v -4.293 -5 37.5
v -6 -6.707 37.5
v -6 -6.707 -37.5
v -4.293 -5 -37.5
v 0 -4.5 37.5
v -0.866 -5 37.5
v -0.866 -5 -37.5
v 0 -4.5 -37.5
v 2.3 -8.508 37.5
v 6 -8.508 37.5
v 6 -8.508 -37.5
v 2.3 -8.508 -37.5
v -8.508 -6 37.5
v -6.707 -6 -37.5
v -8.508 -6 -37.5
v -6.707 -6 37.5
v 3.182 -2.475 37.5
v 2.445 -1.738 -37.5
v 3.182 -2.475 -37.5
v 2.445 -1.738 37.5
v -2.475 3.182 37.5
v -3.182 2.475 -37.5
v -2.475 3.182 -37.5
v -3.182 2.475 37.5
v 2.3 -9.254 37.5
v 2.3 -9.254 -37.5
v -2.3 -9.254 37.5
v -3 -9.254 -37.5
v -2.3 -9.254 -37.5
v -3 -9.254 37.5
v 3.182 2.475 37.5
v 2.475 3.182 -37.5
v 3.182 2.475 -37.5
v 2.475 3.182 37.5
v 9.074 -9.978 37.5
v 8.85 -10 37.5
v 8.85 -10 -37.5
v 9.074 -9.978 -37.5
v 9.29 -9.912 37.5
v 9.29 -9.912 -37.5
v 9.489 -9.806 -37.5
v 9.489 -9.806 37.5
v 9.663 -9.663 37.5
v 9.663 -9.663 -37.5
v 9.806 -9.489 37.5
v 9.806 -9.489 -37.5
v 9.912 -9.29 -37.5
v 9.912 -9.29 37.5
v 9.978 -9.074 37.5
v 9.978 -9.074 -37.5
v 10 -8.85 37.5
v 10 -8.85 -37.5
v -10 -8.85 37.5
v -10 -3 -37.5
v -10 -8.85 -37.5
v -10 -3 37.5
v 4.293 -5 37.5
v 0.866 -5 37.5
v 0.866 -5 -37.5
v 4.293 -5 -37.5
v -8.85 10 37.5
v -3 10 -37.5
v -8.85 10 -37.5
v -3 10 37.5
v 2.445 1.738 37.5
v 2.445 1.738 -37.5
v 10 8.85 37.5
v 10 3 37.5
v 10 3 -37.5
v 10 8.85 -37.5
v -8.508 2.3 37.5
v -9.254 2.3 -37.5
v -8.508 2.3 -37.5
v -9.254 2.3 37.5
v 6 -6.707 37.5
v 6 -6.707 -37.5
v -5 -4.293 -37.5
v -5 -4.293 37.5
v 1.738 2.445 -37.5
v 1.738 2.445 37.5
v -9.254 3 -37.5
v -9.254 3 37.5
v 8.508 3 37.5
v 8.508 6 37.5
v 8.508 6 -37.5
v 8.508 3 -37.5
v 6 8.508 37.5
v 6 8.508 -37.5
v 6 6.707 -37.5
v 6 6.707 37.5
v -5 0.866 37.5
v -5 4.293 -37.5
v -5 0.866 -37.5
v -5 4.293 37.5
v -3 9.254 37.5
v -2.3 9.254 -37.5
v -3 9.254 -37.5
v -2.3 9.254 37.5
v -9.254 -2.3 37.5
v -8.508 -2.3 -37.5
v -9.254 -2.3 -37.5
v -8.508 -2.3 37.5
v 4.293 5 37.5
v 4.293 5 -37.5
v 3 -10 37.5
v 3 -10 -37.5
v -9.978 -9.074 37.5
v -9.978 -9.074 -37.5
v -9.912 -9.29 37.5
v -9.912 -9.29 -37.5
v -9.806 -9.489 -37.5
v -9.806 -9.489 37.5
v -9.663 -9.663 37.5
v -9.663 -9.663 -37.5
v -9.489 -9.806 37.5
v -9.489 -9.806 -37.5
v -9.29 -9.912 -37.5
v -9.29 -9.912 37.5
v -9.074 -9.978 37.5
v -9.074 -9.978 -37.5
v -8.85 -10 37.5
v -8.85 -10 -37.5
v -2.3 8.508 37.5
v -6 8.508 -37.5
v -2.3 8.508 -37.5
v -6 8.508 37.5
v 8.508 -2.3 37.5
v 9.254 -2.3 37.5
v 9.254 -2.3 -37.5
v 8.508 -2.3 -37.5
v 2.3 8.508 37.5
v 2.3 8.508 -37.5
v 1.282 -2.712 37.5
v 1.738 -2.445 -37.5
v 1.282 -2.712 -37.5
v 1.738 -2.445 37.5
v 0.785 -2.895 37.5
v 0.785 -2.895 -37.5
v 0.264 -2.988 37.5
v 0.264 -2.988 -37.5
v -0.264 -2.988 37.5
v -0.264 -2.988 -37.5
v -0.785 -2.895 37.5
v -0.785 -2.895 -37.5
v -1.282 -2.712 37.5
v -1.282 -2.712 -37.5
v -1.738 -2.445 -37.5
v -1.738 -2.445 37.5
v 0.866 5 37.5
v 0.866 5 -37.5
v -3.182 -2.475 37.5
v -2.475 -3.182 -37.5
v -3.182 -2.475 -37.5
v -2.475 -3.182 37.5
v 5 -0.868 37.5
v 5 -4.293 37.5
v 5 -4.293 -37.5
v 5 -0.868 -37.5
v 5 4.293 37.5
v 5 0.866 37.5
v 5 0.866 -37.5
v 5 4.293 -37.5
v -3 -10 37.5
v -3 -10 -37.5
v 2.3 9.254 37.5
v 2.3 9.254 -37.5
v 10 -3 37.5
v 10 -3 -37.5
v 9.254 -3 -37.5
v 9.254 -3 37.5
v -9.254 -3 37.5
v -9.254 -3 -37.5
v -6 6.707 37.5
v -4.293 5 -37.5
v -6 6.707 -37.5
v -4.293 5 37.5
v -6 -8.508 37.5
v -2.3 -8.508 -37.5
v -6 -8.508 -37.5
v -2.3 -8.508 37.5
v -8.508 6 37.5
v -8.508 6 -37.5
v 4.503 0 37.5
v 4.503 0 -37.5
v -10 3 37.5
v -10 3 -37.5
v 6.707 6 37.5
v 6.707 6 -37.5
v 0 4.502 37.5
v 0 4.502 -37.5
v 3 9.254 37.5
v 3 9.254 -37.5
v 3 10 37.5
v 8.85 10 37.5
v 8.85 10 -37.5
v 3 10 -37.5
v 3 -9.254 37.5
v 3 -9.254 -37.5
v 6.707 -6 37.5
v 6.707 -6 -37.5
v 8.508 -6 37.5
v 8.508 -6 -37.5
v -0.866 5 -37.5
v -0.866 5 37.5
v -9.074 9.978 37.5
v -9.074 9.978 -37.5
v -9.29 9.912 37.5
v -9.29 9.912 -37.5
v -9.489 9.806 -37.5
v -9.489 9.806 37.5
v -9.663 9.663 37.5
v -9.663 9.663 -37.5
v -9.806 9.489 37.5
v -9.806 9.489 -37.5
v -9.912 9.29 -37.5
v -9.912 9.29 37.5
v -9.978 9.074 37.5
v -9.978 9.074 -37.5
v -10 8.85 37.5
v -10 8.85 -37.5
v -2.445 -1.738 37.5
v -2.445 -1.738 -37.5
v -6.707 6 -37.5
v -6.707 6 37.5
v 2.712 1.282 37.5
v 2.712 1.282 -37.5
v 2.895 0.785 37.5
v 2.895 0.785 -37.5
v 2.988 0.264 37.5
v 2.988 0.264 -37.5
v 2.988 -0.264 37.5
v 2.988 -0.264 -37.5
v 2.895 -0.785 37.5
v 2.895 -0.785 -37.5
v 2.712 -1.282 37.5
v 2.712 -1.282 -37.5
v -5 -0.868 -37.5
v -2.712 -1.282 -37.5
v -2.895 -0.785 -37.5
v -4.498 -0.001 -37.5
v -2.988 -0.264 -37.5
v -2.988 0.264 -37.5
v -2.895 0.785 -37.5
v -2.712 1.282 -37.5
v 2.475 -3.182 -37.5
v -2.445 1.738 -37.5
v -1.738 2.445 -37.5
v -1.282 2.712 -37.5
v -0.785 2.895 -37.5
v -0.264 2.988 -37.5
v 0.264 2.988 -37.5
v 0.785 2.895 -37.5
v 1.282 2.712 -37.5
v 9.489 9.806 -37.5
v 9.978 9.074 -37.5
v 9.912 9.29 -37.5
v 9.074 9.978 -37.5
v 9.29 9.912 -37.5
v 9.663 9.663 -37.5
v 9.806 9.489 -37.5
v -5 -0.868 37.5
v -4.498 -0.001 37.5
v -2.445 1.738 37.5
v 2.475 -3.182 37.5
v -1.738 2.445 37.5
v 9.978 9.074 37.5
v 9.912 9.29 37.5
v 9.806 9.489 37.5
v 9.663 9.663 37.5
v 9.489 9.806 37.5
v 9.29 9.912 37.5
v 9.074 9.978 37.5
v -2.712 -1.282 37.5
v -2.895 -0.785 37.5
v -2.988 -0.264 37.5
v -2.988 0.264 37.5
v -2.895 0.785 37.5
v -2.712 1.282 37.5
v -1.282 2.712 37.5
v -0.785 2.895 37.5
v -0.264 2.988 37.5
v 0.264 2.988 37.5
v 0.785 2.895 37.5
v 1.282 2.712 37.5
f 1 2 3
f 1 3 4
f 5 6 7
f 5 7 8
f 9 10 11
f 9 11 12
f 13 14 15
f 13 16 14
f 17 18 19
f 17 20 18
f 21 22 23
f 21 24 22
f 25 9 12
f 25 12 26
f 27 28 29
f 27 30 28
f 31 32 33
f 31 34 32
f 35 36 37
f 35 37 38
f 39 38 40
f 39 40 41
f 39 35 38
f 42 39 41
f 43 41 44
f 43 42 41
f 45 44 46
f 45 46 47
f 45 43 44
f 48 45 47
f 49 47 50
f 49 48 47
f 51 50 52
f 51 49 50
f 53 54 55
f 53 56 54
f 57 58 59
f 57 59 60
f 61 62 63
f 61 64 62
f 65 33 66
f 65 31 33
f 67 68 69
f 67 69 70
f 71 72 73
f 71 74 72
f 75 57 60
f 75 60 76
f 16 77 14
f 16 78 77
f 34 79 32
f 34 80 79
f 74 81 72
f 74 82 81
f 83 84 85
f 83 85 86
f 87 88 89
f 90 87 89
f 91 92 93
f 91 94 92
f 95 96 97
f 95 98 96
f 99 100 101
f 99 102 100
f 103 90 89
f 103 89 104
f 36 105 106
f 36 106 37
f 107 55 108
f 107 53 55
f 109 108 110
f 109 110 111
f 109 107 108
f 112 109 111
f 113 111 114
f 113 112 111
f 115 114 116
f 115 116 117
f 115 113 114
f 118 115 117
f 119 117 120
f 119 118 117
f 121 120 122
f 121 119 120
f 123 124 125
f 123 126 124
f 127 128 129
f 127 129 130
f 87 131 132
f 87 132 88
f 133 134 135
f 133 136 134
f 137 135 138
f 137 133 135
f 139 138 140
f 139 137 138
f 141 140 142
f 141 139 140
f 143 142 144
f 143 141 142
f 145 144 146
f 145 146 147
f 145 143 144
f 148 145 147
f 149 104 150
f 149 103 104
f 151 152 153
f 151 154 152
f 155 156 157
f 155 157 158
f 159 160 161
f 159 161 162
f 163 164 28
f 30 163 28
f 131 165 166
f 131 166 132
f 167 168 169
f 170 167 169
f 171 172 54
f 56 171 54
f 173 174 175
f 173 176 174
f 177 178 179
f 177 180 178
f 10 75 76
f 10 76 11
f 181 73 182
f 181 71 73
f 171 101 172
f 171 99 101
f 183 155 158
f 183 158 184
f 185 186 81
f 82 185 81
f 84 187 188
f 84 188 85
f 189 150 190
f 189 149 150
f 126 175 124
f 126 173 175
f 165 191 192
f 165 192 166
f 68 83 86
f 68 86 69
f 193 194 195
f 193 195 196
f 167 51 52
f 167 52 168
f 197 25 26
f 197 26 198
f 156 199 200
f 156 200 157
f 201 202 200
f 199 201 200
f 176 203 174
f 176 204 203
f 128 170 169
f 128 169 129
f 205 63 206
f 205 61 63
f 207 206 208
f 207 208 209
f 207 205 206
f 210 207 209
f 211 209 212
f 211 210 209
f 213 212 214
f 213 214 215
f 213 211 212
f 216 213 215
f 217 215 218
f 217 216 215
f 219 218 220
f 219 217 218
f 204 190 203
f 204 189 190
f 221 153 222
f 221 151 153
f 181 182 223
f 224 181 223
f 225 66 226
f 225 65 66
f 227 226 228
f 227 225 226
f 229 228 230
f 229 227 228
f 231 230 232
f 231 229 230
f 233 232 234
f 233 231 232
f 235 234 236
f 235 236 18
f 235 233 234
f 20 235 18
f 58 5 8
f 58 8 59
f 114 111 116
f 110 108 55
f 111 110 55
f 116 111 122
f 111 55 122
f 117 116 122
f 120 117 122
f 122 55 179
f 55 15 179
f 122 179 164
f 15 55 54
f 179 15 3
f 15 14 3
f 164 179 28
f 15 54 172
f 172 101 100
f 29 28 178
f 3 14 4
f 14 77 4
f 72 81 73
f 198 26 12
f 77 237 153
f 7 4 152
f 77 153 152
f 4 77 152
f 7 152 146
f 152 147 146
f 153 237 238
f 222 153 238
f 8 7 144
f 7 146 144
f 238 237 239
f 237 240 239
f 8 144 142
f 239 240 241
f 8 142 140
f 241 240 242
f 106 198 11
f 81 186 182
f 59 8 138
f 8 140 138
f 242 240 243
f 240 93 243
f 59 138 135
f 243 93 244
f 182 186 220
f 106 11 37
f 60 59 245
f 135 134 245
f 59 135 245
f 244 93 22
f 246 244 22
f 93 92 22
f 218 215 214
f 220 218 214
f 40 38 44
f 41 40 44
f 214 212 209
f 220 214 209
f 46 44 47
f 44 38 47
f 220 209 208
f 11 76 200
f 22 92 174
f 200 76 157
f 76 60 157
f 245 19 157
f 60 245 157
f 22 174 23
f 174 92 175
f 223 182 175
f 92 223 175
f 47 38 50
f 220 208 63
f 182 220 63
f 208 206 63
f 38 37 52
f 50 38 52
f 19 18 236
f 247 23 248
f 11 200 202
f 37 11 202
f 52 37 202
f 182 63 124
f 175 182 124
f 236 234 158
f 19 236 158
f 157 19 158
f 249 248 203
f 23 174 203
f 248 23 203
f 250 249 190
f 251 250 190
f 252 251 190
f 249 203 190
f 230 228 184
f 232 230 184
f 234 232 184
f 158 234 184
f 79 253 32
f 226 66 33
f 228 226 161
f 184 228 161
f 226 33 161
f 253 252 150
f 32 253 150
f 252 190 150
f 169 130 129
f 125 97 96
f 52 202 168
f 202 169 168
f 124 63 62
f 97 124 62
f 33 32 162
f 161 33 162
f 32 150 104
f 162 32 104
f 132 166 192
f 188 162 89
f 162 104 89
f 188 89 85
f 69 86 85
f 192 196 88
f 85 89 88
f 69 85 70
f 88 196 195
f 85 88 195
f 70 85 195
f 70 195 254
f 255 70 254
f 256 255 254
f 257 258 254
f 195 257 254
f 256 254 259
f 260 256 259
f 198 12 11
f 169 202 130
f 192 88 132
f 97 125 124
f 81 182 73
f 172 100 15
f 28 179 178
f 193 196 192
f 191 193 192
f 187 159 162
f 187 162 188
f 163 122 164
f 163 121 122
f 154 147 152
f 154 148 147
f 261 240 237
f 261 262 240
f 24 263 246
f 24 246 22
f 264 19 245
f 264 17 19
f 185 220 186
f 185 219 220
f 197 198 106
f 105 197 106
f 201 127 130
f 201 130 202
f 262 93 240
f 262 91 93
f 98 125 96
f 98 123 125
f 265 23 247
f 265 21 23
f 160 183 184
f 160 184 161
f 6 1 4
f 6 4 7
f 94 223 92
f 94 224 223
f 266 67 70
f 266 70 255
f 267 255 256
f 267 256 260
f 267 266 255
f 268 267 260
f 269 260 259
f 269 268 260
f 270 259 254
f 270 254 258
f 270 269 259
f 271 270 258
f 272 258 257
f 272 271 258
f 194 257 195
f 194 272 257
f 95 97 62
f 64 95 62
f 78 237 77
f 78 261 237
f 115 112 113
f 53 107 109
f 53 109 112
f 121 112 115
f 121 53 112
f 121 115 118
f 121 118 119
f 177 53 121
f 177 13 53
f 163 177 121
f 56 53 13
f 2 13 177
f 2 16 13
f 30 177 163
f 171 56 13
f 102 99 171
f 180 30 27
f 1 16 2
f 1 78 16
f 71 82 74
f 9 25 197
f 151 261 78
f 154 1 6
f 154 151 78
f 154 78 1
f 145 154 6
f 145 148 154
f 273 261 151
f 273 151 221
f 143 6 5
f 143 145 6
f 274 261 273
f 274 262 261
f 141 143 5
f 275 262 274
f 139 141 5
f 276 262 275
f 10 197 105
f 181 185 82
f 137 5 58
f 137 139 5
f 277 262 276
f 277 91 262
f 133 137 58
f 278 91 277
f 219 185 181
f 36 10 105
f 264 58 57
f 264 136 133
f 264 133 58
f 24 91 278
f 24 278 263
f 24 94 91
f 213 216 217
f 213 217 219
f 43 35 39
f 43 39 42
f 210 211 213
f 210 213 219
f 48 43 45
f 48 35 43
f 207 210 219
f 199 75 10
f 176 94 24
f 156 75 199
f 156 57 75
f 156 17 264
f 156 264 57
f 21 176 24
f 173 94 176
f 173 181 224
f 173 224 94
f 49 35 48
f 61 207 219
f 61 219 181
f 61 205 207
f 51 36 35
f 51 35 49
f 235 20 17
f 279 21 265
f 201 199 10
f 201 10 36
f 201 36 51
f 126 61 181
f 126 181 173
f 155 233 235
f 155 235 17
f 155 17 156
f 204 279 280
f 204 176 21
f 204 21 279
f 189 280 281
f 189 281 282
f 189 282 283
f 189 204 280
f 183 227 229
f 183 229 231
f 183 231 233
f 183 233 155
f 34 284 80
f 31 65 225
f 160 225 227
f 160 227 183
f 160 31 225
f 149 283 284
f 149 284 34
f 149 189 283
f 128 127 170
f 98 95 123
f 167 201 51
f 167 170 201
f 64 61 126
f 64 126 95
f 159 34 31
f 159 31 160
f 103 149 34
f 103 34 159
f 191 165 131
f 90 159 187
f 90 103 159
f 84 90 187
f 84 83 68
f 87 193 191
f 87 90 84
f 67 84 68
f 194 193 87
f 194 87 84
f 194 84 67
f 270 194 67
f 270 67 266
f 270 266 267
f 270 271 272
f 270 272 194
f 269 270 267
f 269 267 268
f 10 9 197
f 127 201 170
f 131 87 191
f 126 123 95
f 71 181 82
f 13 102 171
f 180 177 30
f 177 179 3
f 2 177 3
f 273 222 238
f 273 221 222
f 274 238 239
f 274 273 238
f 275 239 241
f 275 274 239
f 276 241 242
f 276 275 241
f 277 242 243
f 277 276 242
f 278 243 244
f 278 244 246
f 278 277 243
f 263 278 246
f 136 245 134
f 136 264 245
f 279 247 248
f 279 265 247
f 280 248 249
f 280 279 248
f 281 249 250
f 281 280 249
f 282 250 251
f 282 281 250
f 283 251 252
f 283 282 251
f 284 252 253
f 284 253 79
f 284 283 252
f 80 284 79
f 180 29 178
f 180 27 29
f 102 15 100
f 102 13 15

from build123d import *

# Parameters (mm, degrees)
RESSALTO_EXTRUS_O1_DEPTH = 37.5


with BuildPart() as part:
    # Esboço1 → Ressalto-extrusão1 (new body, symmetric)
    with BuildSketch(Plane.XY):
        with BuildLine():
            Line((-6, -8.507783687), (-6, -6.707106781))
            Line((-6, -6.707106781), (-4.292893219, -5))
            Line((-4.292893219, -5), (-0.866025404, -5))
            Line((-0.866025404, -5), (0, -4.5))
            Line((0, -4.5), (0.866025404, -5))
            Line((0.866025404, -5), (4.292893219, -5))
            Line((4.292893219, -5), (6, -6.707106781))
            Line((6, -6.707106781), (6, -8.507783687))
            Line((6, -8.507783687), (2.3, -8.507783687))
            Line((2.3, -8.507783687), (2.3, -9.253891844))
            Line((2.3, -9.253891844), (3, -9.253891844))
            Line((3, -9.253891844), (3, -10))
            Line((3, -10), (8.85, -10))
            ThreePointArc((8.85, -10), (9.663172798, -9.663172798), (10, -8.85))
            Line((10, -8.85), (10, -3))
            Line((10, -3), (9.253891844, -3))
            Line((9.253891844, -3), (9.253891844, -2.3))
            Line((9.253891844, -2.3), (8.507783687, -2.3))
            Line((8.507783687, -2.3), (8.507783687, -6))
            Line((8.507783687, -6), (6.707106781, -6))
            Line((6.707106781, -6), (5, -4.292893219))
            Line((5, -4.292893219), (5, -0.867675042))
            Line((5, -0.867675042), (4.502666183, 0))
            Line((4.502666183, 0), (5, 0.866025404))
            Line((5, 0.866025404), (5, 4.292893219))
            Line((5, 4.292893219), (6.707106781, 6))
            Line((6.707106781, 6), (8.507783687, 6))
            Line((8.507783687, 6), (8.507783687, 3))
            Line((8.507783687, 3), (9.253891844, 3))
            Line((9.253891844, 3), (10, 3))
            Line((10, 3), (10, 8.85))
            ThreePointArc((10, 8.85), (9.663172798, 9.663172798), (8.85, 10))
            Line((8.85, 10), (3, 10))
            Line((3, 10), (3, 9.253891844))
            Line((3, 9.253891844), (2.3, 9.253891844))
            Line((2.3, 9.253891844), (2.3, 8.507783687))
            Line((2.3, 8.507783687), (6, 8.507783687))
            Line((6, 8.507783687), (6, 6.707106781))
            Line((6, 6.707106781), (4.292893219, 5))
            Line((4.292893219, 5), (0.866025404, 5))
            Line((0.866025404, 5), (0, 4.502147794))
            Line((0, 4.502147794), (-0.866025404, 5))
            Line((-0.866025404, 5), (-4.292893219, 5))
            Line((-4.292893219, 5), (-6, 6.707106781))
            Line((-6, 6.707106781), (-6, 8.507783687))
            Line((-6, 8.507783687), (-2.3, 8.507783687))
            Line((-2.3, 8.507783687), (-2.3, 9.253891844))
            Line((-2.3, 9.253891844), (-3, 9.253891844))
            Line((-3, 9.253891844), (-3, 10))
            Line((-3, 10), (-8.85, 10))
            ThreePointArc((-8.85, 10), (-9.663172798, 9.663172798), (-10, 8.85))
            Line((-10, 8.85), (-10, 3))
            Line((-10, 3), (-9.253891844, 3))
            Line((-9.253891844, 3), (-9.253891844, 2.3))
            Line((-9.253891844, 2.3), (-8.507783687, 2.3))
            Line((-8.507783687, 2.3), (-8.507783687, 6))
            Line((-8.507783687, 6), (-6.707106781, 6))
            Line((-6.707106781, 6), (-5, 4.292893219))
            Line((-5, 4.292893219), (-5, 0.866025404))
            Line((-5, 0.866025404), (-4.498098017, -0.000824819))
            Line((-4.498098017, -0.000824819), (-5, -0.867675042))
            Line((-5, -0.867675042), (-5, -4.292893219))
            Line((-5, -4.292893219), (-6.707106781, -6))
            Line((-6.707106781, -6), (-8.507783687, -6))
            Line((-8.507783687, -6), (-8.507783687, -2.3))
            Line((-8.507783687, -2.3), (-9.253891844, -2.3))
            Line((-9.253891844, -2.3), (-9.253891844, -3))
            Line((-9.253891844, -3), (-10, -3))
            Line((-10, -3), (-10, -8.85))
            ThreePointArc((-10, -8.85), (-9.663172798, -9.663172798), (-8.85, -10))
            Line((-8.85, -10), (-3, -10))
            Line((-3, -10), (-3, -9.253891844))
            Line((-3, -9.253891844), (-2.3, -9.253891844))
            Line((-2.3, -9.253891844), (-2.3, -8.507783687))
            Line((-2.3, -8.507783687), (-6, -8.507783687))
        make_face()
        with BuildLine():
            Line((-2.445203457, 1.738096676), (-3.181980515, 2.474873734))
            Line((-3.181980515, 2.474873734), (-2.474873734, 3.181980515))
            Line((-2.474873734, 3.181980515), (-1.738096676, 2.445203457))
            ThreePointArc((-1.738096676, 2.445203457), (0, 3), (1.738096676, 2.445203457))
            Line((1.738096676, 2.445203457), (2.474873734, 3.181980515))
            Line((2.474873734, 3.181980515), (3.181980515, 2.474873734))
            Line((3.181980515, 2.474873734), (2.445203457, 1.738096676))
            ThreePointArc((2.445203457, 1.738096676), (3, 0), (2.445203457, -1.738096676))
            Line((2.445203457, -1.738096676), (3.181980515, -2.474873734))
            Line((3.181980515, -2.474873734), (2.474873734, -3.181980515))
            Line((2.474873734, -3.181980515), (1.738096676, -2.445203457))
            ThreePointArc((1.738096676, -2.445203457), (0, -3), (-1.738096676, -2.445203457))
            Line((-1.738096676, -2.445203457), (-2.474873734, -3.181980515))
            Line((-2.474873734, -3.181980515), (-3.181980515, -2.474873734))
            Line((-3.181980515, -2.474873734), (-2.445203457, -1.738096676))
            ThreePointArc((-2.445203457, -1.738096676), (-3, 0), (-2.445203457, 1.738096676))
        make_face(mode=Mode.SUBTRACT)
    extrude(amount=RESSALTO_EXTRUS_O1_DEPTH, both=True)


solid = part.part
